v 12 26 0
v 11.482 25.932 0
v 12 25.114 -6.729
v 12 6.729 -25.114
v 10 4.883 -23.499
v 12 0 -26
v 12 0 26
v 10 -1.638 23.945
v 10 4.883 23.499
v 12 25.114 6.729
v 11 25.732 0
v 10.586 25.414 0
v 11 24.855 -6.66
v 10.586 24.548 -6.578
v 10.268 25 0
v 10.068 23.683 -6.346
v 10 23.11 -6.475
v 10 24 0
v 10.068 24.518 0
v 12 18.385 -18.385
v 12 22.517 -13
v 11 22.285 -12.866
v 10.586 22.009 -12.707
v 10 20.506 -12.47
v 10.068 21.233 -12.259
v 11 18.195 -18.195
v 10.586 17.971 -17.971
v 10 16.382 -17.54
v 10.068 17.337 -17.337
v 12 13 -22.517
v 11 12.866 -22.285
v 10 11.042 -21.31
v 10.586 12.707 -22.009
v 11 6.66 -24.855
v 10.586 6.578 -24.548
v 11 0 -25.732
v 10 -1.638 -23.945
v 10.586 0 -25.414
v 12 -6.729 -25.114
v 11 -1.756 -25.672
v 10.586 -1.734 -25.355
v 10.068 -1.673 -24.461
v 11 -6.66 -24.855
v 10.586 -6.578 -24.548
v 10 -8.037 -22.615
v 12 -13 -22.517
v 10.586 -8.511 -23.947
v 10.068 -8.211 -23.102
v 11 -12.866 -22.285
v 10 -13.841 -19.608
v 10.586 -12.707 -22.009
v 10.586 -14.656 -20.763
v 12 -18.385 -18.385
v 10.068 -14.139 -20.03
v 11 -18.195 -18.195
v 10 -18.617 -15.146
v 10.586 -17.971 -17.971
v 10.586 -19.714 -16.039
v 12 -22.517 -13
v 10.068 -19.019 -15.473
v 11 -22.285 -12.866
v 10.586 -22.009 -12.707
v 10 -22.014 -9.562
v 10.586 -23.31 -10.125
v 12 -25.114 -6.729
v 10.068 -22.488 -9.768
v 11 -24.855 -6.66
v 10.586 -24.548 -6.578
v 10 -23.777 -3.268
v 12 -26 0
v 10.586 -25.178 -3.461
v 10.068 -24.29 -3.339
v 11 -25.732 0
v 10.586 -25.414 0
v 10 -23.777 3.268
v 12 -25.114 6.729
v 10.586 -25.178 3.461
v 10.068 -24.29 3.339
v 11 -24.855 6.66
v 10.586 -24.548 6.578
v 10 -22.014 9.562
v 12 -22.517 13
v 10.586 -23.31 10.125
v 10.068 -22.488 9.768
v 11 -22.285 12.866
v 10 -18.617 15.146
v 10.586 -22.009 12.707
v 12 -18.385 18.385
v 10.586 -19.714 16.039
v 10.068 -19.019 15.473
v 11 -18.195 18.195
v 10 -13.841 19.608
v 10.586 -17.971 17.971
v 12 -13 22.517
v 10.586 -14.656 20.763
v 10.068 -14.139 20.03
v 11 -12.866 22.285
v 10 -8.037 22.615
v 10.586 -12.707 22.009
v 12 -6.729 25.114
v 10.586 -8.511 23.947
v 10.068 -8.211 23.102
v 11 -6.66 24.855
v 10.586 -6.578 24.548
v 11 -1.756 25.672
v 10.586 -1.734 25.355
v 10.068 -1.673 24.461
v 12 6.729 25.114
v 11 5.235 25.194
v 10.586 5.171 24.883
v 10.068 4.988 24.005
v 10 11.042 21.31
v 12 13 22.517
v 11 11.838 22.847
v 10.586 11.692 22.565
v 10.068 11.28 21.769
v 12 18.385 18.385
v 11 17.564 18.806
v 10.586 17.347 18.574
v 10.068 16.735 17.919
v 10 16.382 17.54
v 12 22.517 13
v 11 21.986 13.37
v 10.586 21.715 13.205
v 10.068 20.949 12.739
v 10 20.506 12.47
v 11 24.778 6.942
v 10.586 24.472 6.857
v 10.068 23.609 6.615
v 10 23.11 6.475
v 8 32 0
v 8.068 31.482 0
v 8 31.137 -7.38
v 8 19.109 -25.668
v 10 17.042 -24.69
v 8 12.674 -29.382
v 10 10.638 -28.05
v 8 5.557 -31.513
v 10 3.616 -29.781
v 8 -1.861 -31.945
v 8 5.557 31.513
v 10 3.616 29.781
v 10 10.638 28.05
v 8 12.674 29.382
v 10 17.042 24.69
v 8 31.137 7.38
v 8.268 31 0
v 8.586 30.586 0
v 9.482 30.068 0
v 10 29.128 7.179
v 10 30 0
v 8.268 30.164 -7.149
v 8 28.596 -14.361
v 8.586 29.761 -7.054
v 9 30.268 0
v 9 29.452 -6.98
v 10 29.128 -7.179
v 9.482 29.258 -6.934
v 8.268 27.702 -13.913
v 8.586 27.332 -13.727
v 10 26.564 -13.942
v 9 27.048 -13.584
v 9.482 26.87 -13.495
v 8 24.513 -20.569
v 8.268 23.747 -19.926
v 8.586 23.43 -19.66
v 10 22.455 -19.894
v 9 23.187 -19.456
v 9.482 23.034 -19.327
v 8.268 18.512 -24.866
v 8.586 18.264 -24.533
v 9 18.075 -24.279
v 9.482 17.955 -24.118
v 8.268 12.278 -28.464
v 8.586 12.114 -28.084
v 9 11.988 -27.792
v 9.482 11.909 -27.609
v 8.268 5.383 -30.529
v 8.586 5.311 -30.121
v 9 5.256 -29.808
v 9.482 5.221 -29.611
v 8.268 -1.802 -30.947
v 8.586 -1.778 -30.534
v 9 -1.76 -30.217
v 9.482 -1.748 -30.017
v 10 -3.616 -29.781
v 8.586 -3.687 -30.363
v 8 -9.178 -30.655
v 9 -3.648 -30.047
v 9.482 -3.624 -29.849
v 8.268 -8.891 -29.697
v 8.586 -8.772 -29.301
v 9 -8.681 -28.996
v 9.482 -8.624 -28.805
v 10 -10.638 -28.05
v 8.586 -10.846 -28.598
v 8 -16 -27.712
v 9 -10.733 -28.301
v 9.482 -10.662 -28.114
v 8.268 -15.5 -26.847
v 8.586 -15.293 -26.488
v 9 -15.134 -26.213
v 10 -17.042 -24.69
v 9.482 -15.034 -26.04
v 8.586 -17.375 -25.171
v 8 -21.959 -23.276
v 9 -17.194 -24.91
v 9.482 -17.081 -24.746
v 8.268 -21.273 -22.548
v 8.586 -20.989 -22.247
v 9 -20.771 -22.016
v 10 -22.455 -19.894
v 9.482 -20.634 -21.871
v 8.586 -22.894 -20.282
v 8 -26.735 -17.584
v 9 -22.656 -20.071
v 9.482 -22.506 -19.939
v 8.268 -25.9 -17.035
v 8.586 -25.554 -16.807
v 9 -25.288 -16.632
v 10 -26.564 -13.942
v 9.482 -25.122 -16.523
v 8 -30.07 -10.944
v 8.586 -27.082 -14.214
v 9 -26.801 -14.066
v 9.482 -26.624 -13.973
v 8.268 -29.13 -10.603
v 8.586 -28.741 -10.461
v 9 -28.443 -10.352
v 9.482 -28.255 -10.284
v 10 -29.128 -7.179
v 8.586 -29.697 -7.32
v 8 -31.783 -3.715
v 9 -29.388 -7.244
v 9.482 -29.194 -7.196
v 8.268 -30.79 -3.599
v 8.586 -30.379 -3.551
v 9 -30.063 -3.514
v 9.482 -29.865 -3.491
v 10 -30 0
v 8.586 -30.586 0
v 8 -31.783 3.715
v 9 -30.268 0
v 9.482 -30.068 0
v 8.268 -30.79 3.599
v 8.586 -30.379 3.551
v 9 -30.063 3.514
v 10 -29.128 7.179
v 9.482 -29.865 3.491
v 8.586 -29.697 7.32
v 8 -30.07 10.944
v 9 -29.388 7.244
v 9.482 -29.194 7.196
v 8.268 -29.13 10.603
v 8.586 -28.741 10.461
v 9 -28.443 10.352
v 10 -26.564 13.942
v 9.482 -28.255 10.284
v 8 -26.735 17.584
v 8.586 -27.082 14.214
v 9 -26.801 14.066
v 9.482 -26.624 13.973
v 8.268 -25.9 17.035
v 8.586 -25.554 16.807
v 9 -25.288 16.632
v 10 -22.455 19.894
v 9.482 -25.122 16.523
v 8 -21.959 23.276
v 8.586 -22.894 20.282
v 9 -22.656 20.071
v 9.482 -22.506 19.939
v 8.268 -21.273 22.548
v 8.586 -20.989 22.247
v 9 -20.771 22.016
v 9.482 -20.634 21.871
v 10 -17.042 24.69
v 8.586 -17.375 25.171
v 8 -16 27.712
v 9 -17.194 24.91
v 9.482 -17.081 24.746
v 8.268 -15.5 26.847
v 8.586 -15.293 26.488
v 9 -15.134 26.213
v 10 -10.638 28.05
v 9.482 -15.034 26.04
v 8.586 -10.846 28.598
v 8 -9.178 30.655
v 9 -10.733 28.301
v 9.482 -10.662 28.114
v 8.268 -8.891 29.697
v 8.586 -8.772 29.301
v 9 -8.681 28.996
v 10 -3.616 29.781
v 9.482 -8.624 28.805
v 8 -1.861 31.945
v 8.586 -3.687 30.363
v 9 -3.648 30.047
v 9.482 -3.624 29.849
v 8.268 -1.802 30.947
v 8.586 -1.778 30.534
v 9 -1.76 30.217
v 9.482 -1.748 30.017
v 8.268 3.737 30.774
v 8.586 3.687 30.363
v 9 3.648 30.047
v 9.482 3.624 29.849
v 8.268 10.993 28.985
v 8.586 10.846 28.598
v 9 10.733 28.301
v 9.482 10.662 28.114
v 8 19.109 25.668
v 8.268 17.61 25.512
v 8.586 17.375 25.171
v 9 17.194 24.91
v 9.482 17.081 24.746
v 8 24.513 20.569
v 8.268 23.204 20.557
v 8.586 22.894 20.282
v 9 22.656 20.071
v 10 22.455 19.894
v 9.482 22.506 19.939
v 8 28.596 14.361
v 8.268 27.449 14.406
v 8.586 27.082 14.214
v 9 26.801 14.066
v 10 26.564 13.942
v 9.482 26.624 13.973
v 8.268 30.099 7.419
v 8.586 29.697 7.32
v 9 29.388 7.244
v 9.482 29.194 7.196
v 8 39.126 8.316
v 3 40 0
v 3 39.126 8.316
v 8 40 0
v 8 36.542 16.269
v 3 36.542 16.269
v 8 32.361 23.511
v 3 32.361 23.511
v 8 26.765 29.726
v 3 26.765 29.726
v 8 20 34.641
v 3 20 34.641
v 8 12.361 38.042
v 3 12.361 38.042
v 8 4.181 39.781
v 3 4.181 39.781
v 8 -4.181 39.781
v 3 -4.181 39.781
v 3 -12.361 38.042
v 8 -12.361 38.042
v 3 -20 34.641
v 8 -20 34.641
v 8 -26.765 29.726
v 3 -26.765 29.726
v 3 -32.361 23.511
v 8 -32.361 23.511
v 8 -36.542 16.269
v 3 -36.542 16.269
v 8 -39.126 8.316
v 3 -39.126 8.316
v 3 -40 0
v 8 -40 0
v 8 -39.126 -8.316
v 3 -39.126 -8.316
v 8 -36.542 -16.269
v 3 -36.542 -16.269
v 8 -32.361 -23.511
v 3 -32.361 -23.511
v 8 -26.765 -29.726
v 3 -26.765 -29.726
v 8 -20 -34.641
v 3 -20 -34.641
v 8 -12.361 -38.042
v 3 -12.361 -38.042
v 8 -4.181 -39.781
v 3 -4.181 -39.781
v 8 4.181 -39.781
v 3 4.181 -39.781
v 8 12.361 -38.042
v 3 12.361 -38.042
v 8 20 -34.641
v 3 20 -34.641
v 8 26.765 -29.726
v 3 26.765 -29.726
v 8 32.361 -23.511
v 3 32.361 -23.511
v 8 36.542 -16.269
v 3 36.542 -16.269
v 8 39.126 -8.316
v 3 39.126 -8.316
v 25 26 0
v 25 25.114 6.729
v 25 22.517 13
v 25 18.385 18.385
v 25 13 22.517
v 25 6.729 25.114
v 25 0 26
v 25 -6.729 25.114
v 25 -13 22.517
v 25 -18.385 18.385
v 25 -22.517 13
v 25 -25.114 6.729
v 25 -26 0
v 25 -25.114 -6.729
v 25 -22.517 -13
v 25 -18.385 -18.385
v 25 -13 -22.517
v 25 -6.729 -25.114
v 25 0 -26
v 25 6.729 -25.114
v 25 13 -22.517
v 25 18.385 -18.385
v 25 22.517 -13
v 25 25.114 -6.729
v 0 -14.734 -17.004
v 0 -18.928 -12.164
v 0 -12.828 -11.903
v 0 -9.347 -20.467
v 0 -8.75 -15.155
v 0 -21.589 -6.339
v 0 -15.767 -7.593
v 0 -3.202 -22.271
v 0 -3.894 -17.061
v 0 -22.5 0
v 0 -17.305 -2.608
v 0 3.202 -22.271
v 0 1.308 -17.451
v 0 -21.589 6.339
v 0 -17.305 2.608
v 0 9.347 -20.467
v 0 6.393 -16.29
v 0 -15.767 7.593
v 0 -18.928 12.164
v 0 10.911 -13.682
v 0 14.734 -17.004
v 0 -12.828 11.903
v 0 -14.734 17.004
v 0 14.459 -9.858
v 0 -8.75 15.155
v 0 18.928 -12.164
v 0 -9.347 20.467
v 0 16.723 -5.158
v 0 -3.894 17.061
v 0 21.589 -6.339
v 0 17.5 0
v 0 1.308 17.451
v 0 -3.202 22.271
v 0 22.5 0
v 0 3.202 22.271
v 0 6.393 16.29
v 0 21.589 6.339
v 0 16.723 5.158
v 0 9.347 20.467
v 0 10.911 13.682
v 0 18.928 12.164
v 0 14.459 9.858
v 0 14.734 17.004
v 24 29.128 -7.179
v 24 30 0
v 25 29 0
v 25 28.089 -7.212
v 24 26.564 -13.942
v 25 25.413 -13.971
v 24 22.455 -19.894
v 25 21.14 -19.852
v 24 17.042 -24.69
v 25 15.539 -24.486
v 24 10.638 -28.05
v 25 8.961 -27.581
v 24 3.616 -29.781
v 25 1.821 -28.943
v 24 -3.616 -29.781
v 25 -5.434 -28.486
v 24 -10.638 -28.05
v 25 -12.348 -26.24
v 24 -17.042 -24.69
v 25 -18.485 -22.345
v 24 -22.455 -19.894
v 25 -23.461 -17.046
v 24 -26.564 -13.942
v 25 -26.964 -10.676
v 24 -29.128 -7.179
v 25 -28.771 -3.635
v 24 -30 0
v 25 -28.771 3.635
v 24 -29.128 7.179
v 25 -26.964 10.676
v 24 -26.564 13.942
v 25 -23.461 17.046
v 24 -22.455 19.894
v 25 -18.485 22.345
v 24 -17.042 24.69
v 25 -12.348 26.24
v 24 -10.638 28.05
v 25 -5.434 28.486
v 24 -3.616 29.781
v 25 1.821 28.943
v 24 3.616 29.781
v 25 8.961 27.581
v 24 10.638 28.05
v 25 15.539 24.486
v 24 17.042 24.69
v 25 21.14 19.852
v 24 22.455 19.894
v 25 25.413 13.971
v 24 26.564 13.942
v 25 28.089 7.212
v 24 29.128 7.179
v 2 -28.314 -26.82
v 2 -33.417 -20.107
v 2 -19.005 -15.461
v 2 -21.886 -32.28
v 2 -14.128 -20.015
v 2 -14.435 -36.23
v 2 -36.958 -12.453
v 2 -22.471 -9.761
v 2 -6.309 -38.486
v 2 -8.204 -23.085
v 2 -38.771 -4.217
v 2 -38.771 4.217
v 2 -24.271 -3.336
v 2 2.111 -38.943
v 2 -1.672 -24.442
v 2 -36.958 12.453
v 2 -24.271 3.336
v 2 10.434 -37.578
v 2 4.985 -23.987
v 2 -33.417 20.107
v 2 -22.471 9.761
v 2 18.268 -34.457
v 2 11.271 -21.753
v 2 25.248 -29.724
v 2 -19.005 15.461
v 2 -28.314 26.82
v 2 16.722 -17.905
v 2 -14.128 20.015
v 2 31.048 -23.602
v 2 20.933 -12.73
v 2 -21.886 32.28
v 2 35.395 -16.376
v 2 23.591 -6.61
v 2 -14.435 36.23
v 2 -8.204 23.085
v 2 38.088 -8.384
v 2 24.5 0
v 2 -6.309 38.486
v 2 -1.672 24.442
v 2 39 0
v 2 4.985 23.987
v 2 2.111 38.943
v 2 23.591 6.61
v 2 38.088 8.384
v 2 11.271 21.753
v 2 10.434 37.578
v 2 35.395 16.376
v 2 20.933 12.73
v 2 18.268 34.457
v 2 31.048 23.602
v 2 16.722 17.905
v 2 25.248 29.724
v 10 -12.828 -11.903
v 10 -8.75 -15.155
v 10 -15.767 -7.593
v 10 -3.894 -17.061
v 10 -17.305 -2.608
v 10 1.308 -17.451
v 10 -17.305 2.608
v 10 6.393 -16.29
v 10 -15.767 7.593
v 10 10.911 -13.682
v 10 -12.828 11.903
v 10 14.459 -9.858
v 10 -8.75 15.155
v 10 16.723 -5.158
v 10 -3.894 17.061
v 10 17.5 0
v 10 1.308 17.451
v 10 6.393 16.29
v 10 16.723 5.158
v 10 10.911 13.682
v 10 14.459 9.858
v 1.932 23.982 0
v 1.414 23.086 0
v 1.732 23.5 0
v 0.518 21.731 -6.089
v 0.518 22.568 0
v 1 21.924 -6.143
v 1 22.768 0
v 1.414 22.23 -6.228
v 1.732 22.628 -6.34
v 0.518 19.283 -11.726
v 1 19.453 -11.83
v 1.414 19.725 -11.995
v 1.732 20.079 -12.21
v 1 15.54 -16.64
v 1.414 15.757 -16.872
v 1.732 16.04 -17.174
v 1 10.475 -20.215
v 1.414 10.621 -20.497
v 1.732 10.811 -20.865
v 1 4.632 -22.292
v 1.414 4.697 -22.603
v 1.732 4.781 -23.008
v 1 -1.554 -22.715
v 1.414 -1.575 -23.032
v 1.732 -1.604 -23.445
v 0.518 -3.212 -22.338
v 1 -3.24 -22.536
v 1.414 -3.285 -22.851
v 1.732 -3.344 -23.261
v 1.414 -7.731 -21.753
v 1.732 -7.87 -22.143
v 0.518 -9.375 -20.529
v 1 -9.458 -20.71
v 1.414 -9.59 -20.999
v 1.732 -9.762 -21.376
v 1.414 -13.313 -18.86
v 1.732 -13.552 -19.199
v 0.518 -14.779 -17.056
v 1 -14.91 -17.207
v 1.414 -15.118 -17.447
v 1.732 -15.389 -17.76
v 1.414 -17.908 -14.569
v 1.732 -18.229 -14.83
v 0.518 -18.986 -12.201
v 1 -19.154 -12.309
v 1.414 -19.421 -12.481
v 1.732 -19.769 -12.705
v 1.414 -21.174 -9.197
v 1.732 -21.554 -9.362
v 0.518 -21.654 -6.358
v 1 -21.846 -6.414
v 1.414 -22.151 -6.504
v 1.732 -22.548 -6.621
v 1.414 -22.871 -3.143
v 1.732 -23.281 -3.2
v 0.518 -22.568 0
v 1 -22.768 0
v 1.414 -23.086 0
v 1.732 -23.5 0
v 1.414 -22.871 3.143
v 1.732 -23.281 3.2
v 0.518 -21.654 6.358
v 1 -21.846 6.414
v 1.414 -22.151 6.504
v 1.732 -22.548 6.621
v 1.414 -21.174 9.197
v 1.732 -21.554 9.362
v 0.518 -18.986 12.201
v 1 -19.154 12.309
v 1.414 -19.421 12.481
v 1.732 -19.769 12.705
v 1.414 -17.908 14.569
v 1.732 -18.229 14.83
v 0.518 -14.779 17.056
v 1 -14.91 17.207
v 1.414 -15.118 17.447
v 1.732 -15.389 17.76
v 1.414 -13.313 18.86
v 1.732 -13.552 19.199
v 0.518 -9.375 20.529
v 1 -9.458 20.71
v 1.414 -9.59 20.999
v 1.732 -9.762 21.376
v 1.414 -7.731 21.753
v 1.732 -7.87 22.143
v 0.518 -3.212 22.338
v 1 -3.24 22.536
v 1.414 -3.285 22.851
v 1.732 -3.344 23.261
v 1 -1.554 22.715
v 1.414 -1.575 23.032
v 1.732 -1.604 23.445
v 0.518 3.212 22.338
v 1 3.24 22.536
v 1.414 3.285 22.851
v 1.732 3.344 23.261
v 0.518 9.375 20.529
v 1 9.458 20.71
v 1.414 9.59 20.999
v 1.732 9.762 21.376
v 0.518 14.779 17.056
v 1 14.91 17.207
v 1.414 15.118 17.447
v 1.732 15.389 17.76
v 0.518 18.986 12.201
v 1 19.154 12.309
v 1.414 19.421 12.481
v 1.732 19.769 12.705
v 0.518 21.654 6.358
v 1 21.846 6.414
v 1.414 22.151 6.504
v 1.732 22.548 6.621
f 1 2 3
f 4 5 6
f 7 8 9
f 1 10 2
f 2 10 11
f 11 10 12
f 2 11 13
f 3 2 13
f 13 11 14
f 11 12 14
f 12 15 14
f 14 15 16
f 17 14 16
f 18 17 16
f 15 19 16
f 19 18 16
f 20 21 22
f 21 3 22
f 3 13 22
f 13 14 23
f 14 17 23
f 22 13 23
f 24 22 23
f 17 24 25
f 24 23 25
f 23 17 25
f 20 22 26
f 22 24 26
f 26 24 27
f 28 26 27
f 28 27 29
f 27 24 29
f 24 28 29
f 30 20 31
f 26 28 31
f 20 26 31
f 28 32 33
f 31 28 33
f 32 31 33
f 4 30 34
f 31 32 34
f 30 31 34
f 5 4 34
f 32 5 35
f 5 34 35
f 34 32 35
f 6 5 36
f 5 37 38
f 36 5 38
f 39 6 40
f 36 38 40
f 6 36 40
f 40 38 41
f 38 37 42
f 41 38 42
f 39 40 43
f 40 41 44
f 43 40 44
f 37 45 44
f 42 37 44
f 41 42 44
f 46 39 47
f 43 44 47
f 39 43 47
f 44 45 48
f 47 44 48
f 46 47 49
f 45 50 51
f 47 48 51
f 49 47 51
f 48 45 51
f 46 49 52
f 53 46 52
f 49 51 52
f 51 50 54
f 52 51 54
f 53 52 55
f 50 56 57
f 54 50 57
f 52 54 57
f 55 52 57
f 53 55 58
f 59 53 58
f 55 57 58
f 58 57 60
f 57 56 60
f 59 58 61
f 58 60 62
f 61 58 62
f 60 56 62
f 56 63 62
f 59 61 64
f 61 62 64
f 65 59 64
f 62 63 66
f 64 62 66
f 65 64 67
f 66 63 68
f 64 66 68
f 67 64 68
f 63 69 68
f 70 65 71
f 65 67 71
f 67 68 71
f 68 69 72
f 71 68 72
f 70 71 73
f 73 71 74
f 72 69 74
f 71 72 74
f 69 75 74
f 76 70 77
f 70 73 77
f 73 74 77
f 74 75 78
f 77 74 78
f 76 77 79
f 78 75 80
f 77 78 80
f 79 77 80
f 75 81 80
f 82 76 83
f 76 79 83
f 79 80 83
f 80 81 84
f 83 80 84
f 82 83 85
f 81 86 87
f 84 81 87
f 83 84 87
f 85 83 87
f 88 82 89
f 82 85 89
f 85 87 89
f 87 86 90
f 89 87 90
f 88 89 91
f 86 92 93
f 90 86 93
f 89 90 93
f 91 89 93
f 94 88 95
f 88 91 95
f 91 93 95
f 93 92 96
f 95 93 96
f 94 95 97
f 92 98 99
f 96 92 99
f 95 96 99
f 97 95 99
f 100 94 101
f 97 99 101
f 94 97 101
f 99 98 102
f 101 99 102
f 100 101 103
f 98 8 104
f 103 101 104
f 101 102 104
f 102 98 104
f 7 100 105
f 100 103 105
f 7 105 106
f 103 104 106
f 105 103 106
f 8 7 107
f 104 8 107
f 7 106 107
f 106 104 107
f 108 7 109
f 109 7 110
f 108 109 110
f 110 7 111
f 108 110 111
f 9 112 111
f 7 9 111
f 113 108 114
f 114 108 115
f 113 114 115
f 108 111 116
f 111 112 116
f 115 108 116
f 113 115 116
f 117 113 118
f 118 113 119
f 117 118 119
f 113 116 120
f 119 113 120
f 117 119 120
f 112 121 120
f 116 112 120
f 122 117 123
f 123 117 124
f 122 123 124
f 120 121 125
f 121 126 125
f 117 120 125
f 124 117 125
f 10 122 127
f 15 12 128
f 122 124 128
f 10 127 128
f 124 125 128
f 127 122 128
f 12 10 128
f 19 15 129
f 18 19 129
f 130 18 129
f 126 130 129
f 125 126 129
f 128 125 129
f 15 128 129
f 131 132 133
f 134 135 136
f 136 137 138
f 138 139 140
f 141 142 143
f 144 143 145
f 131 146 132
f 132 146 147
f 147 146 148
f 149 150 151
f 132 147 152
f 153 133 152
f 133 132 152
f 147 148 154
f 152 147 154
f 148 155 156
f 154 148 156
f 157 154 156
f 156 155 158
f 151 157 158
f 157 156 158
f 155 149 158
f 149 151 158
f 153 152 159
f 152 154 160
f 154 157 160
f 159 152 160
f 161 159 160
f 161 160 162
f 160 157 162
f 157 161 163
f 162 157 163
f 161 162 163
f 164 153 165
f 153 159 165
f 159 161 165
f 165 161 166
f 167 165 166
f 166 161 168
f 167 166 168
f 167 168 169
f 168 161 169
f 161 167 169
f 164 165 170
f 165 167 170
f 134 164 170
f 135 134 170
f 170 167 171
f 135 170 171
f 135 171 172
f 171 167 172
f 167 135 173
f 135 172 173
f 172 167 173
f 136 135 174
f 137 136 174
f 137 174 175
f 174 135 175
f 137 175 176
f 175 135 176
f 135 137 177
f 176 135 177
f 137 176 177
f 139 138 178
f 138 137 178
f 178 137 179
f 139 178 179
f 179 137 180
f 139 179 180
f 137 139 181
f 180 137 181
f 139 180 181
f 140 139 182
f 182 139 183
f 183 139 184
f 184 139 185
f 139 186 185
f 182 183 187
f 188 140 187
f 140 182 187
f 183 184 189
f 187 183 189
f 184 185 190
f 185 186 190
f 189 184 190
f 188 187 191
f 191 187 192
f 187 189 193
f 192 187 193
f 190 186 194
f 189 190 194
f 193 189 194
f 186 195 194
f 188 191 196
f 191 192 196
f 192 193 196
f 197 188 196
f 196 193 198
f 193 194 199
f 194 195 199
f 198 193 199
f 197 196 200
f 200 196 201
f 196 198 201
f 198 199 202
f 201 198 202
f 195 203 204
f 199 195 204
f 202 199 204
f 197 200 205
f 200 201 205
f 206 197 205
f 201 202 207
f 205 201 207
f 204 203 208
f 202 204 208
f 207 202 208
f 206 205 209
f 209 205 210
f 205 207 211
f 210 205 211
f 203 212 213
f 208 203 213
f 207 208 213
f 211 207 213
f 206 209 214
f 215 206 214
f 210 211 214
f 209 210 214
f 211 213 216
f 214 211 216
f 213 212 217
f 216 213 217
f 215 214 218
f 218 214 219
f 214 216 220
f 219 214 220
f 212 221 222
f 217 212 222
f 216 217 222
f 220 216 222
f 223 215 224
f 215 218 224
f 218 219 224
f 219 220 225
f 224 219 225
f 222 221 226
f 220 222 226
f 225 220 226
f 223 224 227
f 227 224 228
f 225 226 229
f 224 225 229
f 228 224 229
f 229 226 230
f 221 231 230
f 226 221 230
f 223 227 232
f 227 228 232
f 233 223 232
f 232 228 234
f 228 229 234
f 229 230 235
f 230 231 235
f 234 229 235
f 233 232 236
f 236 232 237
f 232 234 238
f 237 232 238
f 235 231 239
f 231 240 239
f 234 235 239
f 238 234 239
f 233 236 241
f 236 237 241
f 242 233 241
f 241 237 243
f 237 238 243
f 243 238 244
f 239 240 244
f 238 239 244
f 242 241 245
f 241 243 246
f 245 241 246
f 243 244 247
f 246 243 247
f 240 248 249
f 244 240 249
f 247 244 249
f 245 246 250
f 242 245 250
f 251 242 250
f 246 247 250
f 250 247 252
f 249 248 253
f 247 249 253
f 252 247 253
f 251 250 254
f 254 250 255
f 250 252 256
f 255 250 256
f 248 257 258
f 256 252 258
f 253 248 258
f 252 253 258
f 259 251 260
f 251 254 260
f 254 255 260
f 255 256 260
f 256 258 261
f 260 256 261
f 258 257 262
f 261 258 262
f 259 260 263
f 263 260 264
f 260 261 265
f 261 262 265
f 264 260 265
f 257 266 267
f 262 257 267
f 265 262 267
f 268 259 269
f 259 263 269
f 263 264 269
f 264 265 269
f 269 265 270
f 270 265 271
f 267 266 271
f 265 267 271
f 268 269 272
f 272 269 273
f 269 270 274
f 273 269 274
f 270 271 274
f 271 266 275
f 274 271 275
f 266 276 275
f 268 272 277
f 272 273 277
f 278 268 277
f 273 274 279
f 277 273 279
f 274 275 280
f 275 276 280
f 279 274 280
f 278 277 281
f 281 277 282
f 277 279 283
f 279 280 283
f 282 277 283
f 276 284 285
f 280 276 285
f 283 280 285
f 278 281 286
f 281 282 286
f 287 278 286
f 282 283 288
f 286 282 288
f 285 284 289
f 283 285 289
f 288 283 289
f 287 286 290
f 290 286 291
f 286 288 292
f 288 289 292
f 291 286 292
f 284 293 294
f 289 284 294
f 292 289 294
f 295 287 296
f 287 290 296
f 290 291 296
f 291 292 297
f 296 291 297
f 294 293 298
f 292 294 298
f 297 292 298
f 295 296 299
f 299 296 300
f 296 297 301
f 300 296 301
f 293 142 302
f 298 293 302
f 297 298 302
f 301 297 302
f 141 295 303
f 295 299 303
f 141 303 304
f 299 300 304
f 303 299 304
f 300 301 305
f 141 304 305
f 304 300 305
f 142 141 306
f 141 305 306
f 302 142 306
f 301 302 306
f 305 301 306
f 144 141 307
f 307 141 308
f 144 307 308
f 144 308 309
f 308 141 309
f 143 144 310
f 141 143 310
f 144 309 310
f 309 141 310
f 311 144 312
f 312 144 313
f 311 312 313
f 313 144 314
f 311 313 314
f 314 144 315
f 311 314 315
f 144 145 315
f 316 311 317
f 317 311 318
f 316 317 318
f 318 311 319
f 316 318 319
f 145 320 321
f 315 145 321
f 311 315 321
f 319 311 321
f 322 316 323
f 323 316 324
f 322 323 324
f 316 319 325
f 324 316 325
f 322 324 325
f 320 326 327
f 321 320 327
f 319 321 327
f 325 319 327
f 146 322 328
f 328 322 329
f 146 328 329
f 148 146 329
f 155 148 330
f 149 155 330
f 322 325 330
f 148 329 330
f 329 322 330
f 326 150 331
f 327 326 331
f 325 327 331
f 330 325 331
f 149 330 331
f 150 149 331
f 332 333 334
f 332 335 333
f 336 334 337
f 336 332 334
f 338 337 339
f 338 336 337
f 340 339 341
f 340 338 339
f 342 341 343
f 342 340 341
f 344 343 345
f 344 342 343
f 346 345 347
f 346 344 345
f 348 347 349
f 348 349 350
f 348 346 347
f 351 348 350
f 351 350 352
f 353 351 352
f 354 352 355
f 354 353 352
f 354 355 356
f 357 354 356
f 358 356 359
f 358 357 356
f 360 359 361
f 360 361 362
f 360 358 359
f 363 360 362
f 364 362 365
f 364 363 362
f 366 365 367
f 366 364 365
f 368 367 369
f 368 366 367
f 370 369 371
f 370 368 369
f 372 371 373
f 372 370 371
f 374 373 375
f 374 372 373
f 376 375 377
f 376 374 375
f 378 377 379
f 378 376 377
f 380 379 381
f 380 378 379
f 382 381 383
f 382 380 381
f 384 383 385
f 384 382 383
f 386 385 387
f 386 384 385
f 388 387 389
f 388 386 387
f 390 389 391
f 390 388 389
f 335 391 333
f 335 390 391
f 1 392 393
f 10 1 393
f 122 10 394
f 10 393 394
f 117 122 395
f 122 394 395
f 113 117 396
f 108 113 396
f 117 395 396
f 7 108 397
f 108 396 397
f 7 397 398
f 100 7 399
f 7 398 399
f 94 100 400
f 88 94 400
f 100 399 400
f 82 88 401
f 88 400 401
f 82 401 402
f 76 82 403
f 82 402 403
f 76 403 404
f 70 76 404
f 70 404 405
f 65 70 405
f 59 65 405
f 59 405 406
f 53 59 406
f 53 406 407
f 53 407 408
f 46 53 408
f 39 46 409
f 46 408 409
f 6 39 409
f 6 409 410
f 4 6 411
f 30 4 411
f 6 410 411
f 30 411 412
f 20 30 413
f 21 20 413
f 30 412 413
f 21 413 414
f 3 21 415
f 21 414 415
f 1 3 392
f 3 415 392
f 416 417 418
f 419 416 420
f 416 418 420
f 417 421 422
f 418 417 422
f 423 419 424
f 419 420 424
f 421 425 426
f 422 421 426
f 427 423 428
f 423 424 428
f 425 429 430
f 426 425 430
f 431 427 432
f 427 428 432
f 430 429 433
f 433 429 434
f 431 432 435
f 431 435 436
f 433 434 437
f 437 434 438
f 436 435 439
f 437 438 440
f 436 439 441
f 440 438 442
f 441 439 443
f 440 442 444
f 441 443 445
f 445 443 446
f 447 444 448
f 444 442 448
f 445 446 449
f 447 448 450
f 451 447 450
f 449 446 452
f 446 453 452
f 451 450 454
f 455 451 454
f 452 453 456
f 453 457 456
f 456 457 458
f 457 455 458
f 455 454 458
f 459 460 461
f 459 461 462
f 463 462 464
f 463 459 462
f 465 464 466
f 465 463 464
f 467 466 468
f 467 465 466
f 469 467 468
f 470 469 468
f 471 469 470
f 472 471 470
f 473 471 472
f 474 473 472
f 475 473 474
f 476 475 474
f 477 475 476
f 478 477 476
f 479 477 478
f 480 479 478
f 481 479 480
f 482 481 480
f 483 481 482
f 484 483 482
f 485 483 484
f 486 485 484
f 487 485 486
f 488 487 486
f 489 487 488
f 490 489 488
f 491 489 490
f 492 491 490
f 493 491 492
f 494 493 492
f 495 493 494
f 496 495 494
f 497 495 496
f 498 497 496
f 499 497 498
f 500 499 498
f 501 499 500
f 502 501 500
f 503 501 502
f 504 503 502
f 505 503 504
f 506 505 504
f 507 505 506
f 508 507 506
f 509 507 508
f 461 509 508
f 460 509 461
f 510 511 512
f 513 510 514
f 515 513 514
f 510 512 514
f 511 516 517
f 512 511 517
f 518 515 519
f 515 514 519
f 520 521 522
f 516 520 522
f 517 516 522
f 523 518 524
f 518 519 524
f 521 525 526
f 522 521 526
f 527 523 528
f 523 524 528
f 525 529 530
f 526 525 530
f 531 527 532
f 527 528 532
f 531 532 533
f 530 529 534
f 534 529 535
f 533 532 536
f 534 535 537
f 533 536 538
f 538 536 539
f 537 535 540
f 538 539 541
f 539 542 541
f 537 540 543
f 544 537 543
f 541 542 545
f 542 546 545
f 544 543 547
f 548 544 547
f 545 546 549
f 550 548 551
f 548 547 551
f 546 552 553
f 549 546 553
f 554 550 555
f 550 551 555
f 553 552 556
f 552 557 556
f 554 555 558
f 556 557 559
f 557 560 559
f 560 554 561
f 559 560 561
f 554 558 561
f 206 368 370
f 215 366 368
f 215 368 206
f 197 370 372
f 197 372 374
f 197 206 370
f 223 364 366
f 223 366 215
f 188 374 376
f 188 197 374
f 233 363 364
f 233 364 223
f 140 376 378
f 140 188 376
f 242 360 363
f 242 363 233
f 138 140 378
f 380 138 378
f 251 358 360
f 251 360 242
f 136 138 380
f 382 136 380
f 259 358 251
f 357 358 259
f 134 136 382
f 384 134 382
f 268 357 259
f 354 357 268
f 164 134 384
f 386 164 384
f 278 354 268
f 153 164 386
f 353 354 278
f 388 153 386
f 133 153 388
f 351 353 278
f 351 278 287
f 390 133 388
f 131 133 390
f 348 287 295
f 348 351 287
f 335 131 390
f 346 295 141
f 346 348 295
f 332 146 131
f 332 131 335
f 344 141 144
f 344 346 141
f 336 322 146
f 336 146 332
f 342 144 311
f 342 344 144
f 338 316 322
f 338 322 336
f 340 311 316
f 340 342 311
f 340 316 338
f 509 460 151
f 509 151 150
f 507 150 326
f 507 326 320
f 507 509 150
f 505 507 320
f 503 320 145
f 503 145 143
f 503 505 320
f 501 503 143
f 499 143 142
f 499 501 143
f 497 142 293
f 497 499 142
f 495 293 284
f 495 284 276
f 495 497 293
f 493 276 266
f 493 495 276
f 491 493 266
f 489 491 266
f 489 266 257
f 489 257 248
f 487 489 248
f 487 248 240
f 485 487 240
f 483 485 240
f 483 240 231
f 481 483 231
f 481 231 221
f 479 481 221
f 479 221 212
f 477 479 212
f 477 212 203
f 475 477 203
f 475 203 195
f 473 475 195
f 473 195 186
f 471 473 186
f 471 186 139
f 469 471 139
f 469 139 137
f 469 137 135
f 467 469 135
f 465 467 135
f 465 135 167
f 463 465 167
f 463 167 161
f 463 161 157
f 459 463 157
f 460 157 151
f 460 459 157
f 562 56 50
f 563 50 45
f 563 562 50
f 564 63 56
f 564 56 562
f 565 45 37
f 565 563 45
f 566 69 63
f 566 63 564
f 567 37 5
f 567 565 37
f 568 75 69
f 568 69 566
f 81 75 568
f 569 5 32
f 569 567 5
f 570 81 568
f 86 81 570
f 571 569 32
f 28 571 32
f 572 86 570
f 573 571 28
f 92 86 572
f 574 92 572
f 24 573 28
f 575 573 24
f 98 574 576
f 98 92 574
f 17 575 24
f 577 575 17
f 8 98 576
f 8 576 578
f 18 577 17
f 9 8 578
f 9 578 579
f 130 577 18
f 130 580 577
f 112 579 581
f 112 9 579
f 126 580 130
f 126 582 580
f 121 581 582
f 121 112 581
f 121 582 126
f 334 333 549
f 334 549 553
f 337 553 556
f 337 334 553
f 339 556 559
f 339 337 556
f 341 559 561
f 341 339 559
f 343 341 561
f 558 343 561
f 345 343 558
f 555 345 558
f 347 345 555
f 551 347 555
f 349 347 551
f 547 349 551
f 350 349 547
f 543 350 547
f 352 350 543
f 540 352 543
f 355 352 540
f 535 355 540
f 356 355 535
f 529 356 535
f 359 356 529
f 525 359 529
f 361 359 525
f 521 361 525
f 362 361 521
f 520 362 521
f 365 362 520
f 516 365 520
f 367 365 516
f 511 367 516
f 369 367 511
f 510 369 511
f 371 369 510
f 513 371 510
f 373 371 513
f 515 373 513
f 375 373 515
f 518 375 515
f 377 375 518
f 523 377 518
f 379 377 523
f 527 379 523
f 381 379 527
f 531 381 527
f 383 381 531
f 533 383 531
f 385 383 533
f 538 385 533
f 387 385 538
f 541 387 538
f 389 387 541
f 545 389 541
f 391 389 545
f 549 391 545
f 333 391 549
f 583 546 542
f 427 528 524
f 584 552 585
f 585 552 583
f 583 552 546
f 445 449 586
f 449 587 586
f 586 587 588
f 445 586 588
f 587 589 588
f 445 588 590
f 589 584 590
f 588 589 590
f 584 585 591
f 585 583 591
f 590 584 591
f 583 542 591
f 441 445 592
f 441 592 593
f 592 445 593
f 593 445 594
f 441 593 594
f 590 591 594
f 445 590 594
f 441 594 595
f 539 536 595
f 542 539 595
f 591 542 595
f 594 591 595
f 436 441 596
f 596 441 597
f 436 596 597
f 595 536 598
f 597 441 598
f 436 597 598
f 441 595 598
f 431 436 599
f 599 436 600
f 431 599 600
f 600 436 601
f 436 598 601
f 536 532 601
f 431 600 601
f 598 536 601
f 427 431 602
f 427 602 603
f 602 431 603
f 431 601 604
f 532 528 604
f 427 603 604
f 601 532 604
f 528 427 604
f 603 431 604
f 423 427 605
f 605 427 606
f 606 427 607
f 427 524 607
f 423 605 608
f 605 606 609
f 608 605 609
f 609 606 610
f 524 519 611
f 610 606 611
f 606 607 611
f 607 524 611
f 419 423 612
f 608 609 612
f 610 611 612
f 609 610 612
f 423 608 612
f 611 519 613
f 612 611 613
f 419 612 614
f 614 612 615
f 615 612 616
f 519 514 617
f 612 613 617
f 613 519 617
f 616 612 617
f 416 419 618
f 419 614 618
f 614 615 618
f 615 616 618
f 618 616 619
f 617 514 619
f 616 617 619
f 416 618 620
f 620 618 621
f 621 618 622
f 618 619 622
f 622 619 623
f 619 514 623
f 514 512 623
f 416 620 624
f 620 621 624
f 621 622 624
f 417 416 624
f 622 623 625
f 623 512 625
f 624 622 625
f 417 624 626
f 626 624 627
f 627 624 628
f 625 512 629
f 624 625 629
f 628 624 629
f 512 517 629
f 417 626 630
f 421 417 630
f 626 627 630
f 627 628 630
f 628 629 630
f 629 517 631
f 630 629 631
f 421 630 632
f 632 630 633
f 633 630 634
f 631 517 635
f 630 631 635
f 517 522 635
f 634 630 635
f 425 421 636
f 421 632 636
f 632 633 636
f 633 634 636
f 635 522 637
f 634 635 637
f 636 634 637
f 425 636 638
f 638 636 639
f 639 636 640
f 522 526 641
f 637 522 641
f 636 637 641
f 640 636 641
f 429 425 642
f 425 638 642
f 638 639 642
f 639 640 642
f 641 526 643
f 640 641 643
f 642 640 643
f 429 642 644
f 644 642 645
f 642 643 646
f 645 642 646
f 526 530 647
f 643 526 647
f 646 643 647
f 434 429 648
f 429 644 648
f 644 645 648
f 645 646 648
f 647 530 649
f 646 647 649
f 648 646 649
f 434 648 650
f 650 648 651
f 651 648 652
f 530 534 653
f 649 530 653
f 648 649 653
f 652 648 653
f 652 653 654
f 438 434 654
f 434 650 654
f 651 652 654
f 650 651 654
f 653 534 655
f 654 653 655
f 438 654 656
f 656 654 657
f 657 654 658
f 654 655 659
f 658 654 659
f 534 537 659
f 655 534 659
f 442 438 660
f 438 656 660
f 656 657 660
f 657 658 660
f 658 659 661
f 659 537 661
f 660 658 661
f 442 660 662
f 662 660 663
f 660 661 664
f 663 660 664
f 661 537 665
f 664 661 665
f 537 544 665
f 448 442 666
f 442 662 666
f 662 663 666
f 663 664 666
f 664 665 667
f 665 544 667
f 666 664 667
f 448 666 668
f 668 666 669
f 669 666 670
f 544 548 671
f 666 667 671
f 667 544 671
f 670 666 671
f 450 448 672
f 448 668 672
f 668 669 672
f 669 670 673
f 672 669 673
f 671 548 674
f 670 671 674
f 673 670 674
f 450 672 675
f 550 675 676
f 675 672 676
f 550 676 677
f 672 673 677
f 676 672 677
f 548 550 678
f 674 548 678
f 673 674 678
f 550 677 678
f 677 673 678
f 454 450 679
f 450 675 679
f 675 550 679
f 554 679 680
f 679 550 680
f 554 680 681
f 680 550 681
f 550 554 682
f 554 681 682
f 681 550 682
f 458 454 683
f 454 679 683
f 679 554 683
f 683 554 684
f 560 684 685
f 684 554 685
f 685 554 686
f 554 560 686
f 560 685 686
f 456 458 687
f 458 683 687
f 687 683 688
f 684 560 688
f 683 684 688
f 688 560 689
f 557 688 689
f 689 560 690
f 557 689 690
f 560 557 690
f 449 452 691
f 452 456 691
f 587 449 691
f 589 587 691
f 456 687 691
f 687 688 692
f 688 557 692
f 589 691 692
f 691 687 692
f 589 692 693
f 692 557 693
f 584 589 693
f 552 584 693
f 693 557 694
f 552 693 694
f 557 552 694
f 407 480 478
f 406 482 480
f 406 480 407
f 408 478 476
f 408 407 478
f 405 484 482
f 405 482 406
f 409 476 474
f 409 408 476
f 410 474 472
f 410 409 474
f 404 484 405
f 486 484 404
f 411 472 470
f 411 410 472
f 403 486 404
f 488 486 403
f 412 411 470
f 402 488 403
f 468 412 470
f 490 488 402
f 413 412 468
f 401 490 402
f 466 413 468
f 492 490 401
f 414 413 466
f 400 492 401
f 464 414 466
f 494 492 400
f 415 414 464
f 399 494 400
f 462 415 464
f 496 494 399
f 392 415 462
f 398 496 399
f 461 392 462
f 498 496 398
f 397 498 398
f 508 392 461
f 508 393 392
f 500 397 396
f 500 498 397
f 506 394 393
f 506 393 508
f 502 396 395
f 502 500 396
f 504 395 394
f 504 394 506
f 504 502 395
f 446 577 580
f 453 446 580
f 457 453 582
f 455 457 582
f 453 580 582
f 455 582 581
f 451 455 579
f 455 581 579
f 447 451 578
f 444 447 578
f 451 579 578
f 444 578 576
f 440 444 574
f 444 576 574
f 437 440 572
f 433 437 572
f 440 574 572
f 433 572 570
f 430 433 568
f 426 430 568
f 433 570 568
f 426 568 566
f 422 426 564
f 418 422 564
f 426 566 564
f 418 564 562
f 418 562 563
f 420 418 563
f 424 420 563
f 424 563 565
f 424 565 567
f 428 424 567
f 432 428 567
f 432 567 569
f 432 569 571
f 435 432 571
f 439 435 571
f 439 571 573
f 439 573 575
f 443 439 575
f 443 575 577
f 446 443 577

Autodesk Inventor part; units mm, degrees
ref_plane "YZ Plane" through (0, 0, 0) normal (1, 0, 0) x (0, 1, 0)
ref_plane "XZ Plane" through (0, 0, 0) normal (0, 1, 0) x (-1, 0, 0)
ref_plane "XY Plane" through (0, 0, 0) normal (0, 0, 1) x (1, 0, 0)
sketch "Sketch1" plane through (0, 0, 0) normal (0, 0, 1) x (1, 0, 0)
  line L0 (0, 0) -> (23.0859, 0)
  line L1 (0, 17.5) -> (10, 17.5)
  line L2 (10, 17.5) -> (10, 26)
  line L3 (10, 26) -> (25, 26)
  line L4 (0, 22.5) -> (0, 17.5)
  line L5 (2, 22.5) -> (2, 40)
  line L6 (2, 40) -> (8, 40)
  line L7 (8, 40) -> (8, 30)
  line L8 (8, 30) -> (25, 30)
  line L9 (25, 30) -> (25, 26)
  line L10 (0, 22.5) -> (2, 22.5)
  dimension "d0" = 35
  dimension "d1" = 52
  dimension "d2" = 15
  dimension "d3" = 6
  dimension "d4" = 80
  dimension "d5" = 60
  dimension "d6" = 45
  dimension "d7" = 25
  dimension "d8" = 8
revolve "Revolution1" add sketch "Sketch1" angle 360 about axis through (0, 0, 0) along (1, 0, 0)
fillet "Fillet1" radius 2 3 edges at (2, -22.5, 0) (8, -30, 0) (10, -26, 0)
chamfer "Chamfer1" distance 1 angle 45 2 edges at (25, -30, 0) (2, -40, 0)
properties part number "CoverOutput"
